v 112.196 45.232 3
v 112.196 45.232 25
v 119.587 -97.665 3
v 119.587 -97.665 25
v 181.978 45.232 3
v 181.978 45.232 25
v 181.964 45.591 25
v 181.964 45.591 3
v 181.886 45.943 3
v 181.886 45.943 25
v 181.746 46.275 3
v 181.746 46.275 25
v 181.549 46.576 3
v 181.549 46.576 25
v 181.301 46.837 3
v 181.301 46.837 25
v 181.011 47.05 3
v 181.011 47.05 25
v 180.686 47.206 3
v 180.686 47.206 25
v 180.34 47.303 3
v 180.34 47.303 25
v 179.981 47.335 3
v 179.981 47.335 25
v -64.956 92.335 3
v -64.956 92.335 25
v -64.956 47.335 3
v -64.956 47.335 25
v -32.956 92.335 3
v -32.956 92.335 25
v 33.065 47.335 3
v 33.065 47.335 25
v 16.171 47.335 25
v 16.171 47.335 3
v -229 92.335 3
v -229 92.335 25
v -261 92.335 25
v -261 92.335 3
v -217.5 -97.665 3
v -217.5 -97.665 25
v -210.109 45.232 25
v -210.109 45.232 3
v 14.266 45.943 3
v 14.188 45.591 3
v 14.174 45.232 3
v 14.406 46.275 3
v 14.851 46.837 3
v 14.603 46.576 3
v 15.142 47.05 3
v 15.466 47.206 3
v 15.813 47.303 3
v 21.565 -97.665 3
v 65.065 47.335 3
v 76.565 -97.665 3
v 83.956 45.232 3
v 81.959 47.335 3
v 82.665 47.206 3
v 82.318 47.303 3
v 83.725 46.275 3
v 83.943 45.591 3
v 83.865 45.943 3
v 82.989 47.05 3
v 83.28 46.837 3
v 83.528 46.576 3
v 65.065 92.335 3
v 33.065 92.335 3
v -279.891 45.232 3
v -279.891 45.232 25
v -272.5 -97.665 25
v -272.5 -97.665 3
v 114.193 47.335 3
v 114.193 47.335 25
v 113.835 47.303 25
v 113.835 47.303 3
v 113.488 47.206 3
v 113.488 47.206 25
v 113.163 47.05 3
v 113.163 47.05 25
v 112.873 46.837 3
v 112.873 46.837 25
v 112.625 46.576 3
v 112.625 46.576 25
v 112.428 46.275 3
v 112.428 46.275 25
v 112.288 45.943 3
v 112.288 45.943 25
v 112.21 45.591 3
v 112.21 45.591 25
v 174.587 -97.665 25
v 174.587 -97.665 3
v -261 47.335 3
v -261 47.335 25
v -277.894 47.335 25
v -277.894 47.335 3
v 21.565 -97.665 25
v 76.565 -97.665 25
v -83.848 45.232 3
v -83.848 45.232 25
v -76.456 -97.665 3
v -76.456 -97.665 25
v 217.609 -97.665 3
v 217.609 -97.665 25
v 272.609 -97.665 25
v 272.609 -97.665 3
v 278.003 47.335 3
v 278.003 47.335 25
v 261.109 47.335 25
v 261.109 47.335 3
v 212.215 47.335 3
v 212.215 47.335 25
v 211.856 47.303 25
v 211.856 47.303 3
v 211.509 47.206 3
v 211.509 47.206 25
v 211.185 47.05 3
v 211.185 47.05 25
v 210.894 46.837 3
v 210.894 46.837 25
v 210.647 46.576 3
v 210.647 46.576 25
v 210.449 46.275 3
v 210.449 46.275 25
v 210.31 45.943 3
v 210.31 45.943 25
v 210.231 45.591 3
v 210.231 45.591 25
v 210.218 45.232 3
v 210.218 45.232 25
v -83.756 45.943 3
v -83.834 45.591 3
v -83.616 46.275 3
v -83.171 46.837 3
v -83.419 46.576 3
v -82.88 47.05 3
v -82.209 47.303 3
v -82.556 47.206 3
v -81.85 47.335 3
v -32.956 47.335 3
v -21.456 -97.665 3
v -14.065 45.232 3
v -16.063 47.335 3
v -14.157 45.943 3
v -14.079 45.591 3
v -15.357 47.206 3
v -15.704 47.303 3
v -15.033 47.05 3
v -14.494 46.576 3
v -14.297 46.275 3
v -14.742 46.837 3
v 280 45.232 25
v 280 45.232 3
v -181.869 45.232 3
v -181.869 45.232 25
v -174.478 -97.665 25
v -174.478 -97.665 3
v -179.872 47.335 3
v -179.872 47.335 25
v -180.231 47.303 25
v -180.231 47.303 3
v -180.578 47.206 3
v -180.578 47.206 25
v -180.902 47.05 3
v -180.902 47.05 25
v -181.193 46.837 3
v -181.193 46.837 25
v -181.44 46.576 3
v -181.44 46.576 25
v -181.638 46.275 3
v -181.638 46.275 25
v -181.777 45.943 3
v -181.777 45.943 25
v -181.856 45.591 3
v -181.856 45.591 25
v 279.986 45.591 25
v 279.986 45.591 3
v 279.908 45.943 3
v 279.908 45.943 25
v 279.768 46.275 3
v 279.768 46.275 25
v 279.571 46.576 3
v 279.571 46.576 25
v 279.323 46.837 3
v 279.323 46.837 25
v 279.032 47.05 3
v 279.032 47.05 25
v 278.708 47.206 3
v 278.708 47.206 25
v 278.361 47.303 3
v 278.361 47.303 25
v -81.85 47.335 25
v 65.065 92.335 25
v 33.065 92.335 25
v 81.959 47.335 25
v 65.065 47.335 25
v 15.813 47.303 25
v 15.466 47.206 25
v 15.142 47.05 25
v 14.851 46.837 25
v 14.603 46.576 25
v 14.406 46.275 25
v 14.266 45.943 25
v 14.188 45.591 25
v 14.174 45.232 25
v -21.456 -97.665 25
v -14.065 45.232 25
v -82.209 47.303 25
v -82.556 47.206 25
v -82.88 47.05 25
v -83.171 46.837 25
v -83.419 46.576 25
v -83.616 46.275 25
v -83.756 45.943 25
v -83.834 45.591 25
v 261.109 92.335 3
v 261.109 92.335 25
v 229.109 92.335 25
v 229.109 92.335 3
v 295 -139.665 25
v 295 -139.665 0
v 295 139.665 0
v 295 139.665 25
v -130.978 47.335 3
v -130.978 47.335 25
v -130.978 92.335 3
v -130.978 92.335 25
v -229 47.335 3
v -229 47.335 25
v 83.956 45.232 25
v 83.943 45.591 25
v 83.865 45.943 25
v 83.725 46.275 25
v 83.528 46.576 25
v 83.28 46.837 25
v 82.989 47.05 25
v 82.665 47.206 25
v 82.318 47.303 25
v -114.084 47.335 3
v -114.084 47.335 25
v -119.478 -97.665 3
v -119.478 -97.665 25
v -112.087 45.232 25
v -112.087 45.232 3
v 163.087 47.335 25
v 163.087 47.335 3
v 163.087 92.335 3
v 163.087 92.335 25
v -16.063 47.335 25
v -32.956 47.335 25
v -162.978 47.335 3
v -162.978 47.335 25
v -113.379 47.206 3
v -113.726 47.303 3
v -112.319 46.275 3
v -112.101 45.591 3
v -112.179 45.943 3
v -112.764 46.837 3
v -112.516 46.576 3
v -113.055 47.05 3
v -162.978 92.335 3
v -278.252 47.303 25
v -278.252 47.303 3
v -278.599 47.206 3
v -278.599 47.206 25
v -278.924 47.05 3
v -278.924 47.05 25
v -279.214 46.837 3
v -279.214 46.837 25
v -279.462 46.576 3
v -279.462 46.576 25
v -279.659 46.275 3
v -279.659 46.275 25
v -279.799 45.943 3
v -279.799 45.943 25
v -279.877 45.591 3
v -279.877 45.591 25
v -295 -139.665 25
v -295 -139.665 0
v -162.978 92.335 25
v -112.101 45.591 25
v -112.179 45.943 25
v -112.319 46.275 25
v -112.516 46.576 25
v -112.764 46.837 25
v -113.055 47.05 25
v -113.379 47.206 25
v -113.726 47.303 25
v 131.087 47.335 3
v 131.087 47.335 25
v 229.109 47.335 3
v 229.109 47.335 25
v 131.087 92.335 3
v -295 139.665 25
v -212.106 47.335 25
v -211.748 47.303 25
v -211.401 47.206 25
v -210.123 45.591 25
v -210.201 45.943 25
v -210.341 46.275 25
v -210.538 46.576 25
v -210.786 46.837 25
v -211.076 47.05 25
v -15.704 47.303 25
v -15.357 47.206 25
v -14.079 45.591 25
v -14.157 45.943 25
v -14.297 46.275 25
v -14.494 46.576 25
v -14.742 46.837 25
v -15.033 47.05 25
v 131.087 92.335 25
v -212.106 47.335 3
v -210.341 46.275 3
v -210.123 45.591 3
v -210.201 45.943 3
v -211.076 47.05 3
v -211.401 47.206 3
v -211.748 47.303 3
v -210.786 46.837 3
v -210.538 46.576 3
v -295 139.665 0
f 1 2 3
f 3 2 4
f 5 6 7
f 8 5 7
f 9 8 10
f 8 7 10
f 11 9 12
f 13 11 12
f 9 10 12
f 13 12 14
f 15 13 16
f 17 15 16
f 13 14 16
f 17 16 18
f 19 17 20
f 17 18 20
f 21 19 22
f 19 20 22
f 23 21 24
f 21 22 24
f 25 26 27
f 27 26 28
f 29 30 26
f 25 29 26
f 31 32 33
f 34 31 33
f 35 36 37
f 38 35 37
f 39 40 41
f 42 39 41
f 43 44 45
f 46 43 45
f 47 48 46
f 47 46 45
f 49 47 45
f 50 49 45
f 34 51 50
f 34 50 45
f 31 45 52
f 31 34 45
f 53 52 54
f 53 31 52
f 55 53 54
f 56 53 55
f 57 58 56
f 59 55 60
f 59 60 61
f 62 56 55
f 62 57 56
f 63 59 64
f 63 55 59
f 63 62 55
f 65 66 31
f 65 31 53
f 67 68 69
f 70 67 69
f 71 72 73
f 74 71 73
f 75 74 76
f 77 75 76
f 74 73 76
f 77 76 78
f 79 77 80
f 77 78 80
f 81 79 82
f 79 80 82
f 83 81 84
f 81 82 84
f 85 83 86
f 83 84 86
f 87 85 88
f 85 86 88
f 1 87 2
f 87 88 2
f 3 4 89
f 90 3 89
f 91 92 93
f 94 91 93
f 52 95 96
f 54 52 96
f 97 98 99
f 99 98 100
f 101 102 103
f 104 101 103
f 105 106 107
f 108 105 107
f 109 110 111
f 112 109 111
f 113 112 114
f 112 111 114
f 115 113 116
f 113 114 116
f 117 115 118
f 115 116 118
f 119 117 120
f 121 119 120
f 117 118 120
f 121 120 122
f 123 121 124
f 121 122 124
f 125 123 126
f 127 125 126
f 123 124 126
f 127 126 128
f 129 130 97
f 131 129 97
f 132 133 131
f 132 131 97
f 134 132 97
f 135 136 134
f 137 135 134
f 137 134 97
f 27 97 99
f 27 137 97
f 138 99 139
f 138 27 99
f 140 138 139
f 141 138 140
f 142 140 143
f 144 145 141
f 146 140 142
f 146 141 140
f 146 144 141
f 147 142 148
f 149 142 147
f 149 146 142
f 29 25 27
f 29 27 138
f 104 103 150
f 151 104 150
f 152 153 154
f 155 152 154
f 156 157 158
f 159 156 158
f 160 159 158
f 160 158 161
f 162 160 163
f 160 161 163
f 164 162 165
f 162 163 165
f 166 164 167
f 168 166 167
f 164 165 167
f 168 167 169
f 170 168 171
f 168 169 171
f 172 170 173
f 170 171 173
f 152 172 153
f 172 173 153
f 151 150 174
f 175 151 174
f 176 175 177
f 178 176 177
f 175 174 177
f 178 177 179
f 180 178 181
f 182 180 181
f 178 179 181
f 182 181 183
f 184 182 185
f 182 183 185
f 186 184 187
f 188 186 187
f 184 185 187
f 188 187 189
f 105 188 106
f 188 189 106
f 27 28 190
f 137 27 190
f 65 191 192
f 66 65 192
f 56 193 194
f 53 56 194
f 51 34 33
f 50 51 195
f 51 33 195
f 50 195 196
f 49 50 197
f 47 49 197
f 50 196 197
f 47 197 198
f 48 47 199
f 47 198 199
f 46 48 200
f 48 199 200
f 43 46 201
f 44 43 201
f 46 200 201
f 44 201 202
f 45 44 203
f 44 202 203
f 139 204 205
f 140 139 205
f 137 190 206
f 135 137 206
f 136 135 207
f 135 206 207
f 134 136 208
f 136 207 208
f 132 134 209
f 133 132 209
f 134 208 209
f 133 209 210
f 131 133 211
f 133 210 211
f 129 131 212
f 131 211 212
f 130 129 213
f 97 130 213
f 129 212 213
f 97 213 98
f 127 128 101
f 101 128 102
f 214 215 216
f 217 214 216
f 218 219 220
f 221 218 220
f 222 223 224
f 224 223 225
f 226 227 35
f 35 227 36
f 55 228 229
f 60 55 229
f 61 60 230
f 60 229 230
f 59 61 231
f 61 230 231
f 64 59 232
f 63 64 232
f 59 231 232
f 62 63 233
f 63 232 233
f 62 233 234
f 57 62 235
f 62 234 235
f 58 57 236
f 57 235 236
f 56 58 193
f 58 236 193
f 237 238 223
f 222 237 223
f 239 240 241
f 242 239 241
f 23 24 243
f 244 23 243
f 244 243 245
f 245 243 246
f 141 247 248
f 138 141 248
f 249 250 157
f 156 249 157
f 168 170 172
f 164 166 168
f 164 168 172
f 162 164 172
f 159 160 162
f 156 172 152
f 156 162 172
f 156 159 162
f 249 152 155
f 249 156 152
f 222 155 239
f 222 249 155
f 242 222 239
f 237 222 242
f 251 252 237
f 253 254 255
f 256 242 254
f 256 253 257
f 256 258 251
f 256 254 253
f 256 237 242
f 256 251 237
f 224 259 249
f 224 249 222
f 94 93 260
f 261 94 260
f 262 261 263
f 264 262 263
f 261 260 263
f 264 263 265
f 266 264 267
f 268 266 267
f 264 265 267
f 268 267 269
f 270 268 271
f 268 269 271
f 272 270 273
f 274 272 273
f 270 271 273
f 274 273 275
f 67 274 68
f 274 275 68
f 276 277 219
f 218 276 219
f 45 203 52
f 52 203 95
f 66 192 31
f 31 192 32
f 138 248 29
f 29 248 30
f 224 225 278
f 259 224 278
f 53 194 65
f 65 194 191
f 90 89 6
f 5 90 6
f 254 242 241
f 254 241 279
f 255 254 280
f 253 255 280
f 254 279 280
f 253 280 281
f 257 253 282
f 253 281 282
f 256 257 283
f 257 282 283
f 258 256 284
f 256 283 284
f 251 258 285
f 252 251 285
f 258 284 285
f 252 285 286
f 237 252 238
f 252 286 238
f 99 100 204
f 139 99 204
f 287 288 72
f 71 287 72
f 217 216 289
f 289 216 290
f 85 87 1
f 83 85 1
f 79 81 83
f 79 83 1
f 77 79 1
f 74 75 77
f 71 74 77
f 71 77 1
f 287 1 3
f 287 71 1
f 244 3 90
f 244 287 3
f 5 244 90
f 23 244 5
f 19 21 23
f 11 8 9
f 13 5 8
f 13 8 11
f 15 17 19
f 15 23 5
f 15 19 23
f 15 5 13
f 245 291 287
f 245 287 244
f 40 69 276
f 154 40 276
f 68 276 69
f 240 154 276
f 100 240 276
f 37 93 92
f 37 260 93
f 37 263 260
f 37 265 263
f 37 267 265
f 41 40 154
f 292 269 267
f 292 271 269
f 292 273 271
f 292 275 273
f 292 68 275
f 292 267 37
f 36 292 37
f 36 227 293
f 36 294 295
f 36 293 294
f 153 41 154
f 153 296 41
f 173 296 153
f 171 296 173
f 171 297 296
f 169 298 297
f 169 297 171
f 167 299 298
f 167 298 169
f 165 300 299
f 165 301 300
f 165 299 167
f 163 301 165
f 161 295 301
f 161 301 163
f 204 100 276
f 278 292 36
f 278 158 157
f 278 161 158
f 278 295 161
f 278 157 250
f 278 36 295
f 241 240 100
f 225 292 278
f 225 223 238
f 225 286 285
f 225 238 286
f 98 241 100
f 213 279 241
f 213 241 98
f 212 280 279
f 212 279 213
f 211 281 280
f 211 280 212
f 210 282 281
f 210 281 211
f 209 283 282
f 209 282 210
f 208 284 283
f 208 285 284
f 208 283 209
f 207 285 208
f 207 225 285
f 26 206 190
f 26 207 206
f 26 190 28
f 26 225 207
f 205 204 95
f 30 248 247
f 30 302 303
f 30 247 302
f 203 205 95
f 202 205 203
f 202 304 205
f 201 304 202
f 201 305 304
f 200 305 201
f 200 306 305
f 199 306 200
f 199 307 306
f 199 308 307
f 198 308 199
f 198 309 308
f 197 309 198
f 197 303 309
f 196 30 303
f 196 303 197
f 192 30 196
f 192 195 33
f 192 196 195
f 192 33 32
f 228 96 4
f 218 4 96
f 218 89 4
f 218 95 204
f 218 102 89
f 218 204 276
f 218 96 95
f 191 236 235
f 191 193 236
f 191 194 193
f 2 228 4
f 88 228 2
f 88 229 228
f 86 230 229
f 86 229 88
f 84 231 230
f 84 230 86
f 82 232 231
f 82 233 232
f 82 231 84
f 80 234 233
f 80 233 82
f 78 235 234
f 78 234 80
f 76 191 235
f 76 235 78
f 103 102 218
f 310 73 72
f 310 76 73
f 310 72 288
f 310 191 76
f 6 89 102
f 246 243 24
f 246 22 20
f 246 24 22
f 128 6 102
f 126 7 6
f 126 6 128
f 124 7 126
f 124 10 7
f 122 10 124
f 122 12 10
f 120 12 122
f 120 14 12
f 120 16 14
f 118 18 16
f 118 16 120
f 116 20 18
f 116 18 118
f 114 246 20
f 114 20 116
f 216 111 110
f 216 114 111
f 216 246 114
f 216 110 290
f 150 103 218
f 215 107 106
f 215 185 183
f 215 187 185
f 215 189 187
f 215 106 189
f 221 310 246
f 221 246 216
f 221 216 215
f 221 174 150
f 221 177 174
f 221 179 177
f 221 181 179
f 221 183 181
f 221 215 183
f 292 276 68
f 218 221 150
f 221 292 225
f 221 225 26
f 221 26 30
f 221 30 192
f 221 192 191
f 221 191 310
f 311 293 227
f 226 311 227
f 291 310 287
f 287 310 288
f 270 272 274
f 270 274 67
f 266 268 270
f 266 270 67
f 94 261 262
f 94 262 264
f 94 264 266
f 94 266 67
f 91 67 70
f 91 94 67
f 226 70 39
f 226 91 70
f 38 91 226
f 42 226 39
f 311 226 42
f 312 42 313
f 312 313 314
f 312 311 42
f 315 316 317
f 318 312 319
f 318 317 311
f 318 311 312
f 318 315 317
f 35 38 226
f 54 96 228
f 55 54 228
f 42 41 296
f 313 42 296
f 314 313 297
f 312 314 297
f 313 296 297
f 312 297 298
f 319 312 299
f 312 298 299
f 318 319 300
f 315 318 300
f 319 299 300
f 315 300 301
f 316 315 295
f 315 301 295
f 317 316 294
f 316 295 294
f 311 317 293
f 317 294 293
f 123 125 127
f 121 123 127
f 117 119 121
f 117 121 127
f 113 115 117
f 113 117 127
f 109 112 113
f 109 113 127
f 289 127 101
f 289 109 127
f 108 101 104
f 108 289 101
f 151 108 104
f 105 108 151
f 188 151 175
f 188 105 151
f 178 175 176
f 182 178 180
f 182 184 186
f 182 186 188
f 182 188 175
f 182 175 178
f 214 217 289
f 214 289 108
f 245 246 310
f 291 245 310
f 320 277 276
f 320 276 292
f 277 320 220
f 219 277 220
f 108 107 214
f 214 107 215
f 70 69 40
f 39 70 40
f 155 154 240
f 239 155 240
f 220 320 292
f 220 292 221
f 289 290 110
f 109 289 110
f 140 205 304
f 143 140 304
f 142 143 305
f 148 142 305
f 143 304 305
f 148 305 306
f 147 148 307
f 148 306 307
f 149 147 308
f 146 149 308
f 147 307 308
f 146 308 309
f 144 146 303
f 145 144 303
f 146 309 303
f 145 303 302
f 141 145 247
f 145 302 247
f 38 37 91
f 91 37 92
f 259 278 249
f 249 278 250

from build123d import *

# Parameters (mm, degrees)
SKETCH2_W           = 590
SKETCH2_H           = 279.33
BOSS_EXTRUDE1_DEPTH = 25
CUT_EXTRUDE1_DEPTH  = 22


with BuildPart() as part:
    # Sketch2 → Boss-Extrude1 (new body)
    with BuildSketch(Plane.XY):
        Rectangle(SKETCH2_W, SKETCH2_H)
    extrude(amount=BOSS_EXTRUDE1_DEPTH)

    # Sketch4 → Cut-Extrude1 (cut)
    with BuildSketch(Plane.XY.offset(25)):
        with BuildLine():
            Line((-261, 47.335), (-277.893878125, 47.335))
            ThreePointArc((-277.893878125, 47.335), (-279.344157467, 46.712203627), (-279.891208095, 45.231689829))
            Line((-279.891208095, 45.231689829), (-272.5, -97.665))
            Line((-272.5, -97.665), (-217.5, -97.665))
            Line((-217.5, -97.665), (-210.108791905, 45.231689829))
            ThreePointArc((-210.108791905, 45.231689829), (-210.655842533, 46.712203627), (-212.106121875, 47.335))
            Line((-212.106121875, 47.335), (-229, 47.335))
            Line((-229, 47.335), (-229, 92.335))
            Line((-229, 92.335), (-261, 92.335))
            Line((-261, 92.335), (-261, 47.335))
        make_face()
        with BuildLine():
            Line((-21.456483238, -97.665), (-14.065275143, 45.231689829))
            ThreePointArc((-14.065275143, 45.231689829), (-14.612325771, 46.712203627), (-16.062605113, 47.335))
            Line((-16.062605113, 47.335), (-32.956483238, 47.335))
            Line((-32.956483238, 47.335), (-32.956483238, 92.335))
            Line((-32.956483238, 92.335), (-64.956483238, 92.335))
            Line((-64.956483238, 92.335), (-64.956483238, 47.335))
            Line((-64.956483238, 47.335), (-81.850361363, 47.335))
            ThreePointArc((-81.850361363, 47.335), (-83.300640705, 46.712203627), (-83.847691332, 45.231689829))
            Line((-83.847691332, 45.231689829), (-76.456483238, -97.665))
            Line((-76.456483238, -97.665), (-21.456483238, -97.665))
        make_face()
        with BuildLine():
            Line((-181.869449714, 45.231689829), (-174.478241619, -97.665))
            Line((-174.478241619, -97.665), (-119.478241619, -97.665))
            Line((-119.478241619, -97.665), (-112.087033524, 45.231689829))
            ThreePointArc((-112.087033524, 45.231689829), (-112.634084152, 46.712203627), (-114.084363494, 47.335))
            Line((-114.084363494, 47.335), (-130.978241619, 47.335))
            Line((-130.978241619, 47.335), (-130.978241619, 92.335))
            Line((-130.978241619, 92.335), (-162.978241619, 92.335))
            Line((-162.978241619, 92.335), (-162.978241619, 47.335))
            Line((-162.978241619, 47.335), (-179.872119744, 47.335))
            ThreePointArc((-179.872119744, 47.335), (-181.322399086, 46.712203627), (-181.869449714, 45.231689829))
        make_face()
        with BuildLine():
            Line((76.565275143, -97.665), (83.956483238, 45.231689829))
            ThreePointArc((83.956483238, 45.231689829), (83.40943261, 46.712203627), (81.959153268, 47.335))
            Line((81.959153268, 47.335), (65.065275143, 47.335))
            Line((65.065275143, 47.335), (65.065275143, 92.335))
            Line((65.065275143, 92.335), (33.065275143, 92.335))
            Line((33.065275143, 92.335), (33.065275143, 47.335))
            Line((33.065275143, 47.335), (16.171397019, 47.335))
            ThreePointArc((16.171397019, 47.335), (14.721117676, 46.712203627), (14.174067049, 45.231689829))
            Line((14.174067049, 45.231689829), (21.565275143, -97.665))
            Line((21.565275143, -97.665), (76.565275143, -97.665))
        make_face()
        with BuildLine():
            Line((174.587033524, -97.665), (181.978241619, 45.231689829))
            ThreePointArc((181.978241619, 45.231689829), (181.431190991, 46.712203627), (179.980911649, 47.335))
            Line((179.980911649, 47.335), (163.087033524, 47.335))
            Line((163.087033524, 47.335), (163.087033524, 92.335))
            Line((163.087033524, 92.335), (131.087033524, 92.335))
            Line((131.087033524, 92.335), (131.087033524, 47.335))
            Line((131.087033524, 47.335), (114.1931554, 47.335))
            ThreePointArc((114.1931554, 47.335), (112.742876057, 46.712203627), (112.19582543, 45.231689829))
            Line((112.19582543, 45.231689829), (119.587033524, -97.665))
            Line((119.587033524, -97.665), (174.587033524, -97.665))
        make_face()
        with BuildLine():
            Line((210.217583811, 45.231689829), (217.608791905, -97.665))
            Line((217.608791905, -97.665), (272.608791905, -97.665))
            Line((272.608791905, -97.665), (280, 45.231689829))
            ThreePointArc((280, 45.231689829), (279.452949372, 46.712203627), (278.00267003, 47.335))
            Line((278.00267003, 47.335), (261.108791905, 47.335))
            Line((261.108791905, 47.335), (261.108791905, 92.335))
            Line((261.108791905, 92.335), (229.108791905, 92.335))
            Line((229.108791905, 92.335), (229.108791905, 47.335))
            Line((229.108791905, 47.335), (212.214913781, 47.335))
            ThreePointArc((212.214913781, 47.335), (210.764634438, 46.712203627), (210.217583811, 45.231689829))
        make_face()
    extrude(amount=-CUT_EXTRUDE1_DEPTH, mode=Mode.SUBTRACT)


solid = part.part
